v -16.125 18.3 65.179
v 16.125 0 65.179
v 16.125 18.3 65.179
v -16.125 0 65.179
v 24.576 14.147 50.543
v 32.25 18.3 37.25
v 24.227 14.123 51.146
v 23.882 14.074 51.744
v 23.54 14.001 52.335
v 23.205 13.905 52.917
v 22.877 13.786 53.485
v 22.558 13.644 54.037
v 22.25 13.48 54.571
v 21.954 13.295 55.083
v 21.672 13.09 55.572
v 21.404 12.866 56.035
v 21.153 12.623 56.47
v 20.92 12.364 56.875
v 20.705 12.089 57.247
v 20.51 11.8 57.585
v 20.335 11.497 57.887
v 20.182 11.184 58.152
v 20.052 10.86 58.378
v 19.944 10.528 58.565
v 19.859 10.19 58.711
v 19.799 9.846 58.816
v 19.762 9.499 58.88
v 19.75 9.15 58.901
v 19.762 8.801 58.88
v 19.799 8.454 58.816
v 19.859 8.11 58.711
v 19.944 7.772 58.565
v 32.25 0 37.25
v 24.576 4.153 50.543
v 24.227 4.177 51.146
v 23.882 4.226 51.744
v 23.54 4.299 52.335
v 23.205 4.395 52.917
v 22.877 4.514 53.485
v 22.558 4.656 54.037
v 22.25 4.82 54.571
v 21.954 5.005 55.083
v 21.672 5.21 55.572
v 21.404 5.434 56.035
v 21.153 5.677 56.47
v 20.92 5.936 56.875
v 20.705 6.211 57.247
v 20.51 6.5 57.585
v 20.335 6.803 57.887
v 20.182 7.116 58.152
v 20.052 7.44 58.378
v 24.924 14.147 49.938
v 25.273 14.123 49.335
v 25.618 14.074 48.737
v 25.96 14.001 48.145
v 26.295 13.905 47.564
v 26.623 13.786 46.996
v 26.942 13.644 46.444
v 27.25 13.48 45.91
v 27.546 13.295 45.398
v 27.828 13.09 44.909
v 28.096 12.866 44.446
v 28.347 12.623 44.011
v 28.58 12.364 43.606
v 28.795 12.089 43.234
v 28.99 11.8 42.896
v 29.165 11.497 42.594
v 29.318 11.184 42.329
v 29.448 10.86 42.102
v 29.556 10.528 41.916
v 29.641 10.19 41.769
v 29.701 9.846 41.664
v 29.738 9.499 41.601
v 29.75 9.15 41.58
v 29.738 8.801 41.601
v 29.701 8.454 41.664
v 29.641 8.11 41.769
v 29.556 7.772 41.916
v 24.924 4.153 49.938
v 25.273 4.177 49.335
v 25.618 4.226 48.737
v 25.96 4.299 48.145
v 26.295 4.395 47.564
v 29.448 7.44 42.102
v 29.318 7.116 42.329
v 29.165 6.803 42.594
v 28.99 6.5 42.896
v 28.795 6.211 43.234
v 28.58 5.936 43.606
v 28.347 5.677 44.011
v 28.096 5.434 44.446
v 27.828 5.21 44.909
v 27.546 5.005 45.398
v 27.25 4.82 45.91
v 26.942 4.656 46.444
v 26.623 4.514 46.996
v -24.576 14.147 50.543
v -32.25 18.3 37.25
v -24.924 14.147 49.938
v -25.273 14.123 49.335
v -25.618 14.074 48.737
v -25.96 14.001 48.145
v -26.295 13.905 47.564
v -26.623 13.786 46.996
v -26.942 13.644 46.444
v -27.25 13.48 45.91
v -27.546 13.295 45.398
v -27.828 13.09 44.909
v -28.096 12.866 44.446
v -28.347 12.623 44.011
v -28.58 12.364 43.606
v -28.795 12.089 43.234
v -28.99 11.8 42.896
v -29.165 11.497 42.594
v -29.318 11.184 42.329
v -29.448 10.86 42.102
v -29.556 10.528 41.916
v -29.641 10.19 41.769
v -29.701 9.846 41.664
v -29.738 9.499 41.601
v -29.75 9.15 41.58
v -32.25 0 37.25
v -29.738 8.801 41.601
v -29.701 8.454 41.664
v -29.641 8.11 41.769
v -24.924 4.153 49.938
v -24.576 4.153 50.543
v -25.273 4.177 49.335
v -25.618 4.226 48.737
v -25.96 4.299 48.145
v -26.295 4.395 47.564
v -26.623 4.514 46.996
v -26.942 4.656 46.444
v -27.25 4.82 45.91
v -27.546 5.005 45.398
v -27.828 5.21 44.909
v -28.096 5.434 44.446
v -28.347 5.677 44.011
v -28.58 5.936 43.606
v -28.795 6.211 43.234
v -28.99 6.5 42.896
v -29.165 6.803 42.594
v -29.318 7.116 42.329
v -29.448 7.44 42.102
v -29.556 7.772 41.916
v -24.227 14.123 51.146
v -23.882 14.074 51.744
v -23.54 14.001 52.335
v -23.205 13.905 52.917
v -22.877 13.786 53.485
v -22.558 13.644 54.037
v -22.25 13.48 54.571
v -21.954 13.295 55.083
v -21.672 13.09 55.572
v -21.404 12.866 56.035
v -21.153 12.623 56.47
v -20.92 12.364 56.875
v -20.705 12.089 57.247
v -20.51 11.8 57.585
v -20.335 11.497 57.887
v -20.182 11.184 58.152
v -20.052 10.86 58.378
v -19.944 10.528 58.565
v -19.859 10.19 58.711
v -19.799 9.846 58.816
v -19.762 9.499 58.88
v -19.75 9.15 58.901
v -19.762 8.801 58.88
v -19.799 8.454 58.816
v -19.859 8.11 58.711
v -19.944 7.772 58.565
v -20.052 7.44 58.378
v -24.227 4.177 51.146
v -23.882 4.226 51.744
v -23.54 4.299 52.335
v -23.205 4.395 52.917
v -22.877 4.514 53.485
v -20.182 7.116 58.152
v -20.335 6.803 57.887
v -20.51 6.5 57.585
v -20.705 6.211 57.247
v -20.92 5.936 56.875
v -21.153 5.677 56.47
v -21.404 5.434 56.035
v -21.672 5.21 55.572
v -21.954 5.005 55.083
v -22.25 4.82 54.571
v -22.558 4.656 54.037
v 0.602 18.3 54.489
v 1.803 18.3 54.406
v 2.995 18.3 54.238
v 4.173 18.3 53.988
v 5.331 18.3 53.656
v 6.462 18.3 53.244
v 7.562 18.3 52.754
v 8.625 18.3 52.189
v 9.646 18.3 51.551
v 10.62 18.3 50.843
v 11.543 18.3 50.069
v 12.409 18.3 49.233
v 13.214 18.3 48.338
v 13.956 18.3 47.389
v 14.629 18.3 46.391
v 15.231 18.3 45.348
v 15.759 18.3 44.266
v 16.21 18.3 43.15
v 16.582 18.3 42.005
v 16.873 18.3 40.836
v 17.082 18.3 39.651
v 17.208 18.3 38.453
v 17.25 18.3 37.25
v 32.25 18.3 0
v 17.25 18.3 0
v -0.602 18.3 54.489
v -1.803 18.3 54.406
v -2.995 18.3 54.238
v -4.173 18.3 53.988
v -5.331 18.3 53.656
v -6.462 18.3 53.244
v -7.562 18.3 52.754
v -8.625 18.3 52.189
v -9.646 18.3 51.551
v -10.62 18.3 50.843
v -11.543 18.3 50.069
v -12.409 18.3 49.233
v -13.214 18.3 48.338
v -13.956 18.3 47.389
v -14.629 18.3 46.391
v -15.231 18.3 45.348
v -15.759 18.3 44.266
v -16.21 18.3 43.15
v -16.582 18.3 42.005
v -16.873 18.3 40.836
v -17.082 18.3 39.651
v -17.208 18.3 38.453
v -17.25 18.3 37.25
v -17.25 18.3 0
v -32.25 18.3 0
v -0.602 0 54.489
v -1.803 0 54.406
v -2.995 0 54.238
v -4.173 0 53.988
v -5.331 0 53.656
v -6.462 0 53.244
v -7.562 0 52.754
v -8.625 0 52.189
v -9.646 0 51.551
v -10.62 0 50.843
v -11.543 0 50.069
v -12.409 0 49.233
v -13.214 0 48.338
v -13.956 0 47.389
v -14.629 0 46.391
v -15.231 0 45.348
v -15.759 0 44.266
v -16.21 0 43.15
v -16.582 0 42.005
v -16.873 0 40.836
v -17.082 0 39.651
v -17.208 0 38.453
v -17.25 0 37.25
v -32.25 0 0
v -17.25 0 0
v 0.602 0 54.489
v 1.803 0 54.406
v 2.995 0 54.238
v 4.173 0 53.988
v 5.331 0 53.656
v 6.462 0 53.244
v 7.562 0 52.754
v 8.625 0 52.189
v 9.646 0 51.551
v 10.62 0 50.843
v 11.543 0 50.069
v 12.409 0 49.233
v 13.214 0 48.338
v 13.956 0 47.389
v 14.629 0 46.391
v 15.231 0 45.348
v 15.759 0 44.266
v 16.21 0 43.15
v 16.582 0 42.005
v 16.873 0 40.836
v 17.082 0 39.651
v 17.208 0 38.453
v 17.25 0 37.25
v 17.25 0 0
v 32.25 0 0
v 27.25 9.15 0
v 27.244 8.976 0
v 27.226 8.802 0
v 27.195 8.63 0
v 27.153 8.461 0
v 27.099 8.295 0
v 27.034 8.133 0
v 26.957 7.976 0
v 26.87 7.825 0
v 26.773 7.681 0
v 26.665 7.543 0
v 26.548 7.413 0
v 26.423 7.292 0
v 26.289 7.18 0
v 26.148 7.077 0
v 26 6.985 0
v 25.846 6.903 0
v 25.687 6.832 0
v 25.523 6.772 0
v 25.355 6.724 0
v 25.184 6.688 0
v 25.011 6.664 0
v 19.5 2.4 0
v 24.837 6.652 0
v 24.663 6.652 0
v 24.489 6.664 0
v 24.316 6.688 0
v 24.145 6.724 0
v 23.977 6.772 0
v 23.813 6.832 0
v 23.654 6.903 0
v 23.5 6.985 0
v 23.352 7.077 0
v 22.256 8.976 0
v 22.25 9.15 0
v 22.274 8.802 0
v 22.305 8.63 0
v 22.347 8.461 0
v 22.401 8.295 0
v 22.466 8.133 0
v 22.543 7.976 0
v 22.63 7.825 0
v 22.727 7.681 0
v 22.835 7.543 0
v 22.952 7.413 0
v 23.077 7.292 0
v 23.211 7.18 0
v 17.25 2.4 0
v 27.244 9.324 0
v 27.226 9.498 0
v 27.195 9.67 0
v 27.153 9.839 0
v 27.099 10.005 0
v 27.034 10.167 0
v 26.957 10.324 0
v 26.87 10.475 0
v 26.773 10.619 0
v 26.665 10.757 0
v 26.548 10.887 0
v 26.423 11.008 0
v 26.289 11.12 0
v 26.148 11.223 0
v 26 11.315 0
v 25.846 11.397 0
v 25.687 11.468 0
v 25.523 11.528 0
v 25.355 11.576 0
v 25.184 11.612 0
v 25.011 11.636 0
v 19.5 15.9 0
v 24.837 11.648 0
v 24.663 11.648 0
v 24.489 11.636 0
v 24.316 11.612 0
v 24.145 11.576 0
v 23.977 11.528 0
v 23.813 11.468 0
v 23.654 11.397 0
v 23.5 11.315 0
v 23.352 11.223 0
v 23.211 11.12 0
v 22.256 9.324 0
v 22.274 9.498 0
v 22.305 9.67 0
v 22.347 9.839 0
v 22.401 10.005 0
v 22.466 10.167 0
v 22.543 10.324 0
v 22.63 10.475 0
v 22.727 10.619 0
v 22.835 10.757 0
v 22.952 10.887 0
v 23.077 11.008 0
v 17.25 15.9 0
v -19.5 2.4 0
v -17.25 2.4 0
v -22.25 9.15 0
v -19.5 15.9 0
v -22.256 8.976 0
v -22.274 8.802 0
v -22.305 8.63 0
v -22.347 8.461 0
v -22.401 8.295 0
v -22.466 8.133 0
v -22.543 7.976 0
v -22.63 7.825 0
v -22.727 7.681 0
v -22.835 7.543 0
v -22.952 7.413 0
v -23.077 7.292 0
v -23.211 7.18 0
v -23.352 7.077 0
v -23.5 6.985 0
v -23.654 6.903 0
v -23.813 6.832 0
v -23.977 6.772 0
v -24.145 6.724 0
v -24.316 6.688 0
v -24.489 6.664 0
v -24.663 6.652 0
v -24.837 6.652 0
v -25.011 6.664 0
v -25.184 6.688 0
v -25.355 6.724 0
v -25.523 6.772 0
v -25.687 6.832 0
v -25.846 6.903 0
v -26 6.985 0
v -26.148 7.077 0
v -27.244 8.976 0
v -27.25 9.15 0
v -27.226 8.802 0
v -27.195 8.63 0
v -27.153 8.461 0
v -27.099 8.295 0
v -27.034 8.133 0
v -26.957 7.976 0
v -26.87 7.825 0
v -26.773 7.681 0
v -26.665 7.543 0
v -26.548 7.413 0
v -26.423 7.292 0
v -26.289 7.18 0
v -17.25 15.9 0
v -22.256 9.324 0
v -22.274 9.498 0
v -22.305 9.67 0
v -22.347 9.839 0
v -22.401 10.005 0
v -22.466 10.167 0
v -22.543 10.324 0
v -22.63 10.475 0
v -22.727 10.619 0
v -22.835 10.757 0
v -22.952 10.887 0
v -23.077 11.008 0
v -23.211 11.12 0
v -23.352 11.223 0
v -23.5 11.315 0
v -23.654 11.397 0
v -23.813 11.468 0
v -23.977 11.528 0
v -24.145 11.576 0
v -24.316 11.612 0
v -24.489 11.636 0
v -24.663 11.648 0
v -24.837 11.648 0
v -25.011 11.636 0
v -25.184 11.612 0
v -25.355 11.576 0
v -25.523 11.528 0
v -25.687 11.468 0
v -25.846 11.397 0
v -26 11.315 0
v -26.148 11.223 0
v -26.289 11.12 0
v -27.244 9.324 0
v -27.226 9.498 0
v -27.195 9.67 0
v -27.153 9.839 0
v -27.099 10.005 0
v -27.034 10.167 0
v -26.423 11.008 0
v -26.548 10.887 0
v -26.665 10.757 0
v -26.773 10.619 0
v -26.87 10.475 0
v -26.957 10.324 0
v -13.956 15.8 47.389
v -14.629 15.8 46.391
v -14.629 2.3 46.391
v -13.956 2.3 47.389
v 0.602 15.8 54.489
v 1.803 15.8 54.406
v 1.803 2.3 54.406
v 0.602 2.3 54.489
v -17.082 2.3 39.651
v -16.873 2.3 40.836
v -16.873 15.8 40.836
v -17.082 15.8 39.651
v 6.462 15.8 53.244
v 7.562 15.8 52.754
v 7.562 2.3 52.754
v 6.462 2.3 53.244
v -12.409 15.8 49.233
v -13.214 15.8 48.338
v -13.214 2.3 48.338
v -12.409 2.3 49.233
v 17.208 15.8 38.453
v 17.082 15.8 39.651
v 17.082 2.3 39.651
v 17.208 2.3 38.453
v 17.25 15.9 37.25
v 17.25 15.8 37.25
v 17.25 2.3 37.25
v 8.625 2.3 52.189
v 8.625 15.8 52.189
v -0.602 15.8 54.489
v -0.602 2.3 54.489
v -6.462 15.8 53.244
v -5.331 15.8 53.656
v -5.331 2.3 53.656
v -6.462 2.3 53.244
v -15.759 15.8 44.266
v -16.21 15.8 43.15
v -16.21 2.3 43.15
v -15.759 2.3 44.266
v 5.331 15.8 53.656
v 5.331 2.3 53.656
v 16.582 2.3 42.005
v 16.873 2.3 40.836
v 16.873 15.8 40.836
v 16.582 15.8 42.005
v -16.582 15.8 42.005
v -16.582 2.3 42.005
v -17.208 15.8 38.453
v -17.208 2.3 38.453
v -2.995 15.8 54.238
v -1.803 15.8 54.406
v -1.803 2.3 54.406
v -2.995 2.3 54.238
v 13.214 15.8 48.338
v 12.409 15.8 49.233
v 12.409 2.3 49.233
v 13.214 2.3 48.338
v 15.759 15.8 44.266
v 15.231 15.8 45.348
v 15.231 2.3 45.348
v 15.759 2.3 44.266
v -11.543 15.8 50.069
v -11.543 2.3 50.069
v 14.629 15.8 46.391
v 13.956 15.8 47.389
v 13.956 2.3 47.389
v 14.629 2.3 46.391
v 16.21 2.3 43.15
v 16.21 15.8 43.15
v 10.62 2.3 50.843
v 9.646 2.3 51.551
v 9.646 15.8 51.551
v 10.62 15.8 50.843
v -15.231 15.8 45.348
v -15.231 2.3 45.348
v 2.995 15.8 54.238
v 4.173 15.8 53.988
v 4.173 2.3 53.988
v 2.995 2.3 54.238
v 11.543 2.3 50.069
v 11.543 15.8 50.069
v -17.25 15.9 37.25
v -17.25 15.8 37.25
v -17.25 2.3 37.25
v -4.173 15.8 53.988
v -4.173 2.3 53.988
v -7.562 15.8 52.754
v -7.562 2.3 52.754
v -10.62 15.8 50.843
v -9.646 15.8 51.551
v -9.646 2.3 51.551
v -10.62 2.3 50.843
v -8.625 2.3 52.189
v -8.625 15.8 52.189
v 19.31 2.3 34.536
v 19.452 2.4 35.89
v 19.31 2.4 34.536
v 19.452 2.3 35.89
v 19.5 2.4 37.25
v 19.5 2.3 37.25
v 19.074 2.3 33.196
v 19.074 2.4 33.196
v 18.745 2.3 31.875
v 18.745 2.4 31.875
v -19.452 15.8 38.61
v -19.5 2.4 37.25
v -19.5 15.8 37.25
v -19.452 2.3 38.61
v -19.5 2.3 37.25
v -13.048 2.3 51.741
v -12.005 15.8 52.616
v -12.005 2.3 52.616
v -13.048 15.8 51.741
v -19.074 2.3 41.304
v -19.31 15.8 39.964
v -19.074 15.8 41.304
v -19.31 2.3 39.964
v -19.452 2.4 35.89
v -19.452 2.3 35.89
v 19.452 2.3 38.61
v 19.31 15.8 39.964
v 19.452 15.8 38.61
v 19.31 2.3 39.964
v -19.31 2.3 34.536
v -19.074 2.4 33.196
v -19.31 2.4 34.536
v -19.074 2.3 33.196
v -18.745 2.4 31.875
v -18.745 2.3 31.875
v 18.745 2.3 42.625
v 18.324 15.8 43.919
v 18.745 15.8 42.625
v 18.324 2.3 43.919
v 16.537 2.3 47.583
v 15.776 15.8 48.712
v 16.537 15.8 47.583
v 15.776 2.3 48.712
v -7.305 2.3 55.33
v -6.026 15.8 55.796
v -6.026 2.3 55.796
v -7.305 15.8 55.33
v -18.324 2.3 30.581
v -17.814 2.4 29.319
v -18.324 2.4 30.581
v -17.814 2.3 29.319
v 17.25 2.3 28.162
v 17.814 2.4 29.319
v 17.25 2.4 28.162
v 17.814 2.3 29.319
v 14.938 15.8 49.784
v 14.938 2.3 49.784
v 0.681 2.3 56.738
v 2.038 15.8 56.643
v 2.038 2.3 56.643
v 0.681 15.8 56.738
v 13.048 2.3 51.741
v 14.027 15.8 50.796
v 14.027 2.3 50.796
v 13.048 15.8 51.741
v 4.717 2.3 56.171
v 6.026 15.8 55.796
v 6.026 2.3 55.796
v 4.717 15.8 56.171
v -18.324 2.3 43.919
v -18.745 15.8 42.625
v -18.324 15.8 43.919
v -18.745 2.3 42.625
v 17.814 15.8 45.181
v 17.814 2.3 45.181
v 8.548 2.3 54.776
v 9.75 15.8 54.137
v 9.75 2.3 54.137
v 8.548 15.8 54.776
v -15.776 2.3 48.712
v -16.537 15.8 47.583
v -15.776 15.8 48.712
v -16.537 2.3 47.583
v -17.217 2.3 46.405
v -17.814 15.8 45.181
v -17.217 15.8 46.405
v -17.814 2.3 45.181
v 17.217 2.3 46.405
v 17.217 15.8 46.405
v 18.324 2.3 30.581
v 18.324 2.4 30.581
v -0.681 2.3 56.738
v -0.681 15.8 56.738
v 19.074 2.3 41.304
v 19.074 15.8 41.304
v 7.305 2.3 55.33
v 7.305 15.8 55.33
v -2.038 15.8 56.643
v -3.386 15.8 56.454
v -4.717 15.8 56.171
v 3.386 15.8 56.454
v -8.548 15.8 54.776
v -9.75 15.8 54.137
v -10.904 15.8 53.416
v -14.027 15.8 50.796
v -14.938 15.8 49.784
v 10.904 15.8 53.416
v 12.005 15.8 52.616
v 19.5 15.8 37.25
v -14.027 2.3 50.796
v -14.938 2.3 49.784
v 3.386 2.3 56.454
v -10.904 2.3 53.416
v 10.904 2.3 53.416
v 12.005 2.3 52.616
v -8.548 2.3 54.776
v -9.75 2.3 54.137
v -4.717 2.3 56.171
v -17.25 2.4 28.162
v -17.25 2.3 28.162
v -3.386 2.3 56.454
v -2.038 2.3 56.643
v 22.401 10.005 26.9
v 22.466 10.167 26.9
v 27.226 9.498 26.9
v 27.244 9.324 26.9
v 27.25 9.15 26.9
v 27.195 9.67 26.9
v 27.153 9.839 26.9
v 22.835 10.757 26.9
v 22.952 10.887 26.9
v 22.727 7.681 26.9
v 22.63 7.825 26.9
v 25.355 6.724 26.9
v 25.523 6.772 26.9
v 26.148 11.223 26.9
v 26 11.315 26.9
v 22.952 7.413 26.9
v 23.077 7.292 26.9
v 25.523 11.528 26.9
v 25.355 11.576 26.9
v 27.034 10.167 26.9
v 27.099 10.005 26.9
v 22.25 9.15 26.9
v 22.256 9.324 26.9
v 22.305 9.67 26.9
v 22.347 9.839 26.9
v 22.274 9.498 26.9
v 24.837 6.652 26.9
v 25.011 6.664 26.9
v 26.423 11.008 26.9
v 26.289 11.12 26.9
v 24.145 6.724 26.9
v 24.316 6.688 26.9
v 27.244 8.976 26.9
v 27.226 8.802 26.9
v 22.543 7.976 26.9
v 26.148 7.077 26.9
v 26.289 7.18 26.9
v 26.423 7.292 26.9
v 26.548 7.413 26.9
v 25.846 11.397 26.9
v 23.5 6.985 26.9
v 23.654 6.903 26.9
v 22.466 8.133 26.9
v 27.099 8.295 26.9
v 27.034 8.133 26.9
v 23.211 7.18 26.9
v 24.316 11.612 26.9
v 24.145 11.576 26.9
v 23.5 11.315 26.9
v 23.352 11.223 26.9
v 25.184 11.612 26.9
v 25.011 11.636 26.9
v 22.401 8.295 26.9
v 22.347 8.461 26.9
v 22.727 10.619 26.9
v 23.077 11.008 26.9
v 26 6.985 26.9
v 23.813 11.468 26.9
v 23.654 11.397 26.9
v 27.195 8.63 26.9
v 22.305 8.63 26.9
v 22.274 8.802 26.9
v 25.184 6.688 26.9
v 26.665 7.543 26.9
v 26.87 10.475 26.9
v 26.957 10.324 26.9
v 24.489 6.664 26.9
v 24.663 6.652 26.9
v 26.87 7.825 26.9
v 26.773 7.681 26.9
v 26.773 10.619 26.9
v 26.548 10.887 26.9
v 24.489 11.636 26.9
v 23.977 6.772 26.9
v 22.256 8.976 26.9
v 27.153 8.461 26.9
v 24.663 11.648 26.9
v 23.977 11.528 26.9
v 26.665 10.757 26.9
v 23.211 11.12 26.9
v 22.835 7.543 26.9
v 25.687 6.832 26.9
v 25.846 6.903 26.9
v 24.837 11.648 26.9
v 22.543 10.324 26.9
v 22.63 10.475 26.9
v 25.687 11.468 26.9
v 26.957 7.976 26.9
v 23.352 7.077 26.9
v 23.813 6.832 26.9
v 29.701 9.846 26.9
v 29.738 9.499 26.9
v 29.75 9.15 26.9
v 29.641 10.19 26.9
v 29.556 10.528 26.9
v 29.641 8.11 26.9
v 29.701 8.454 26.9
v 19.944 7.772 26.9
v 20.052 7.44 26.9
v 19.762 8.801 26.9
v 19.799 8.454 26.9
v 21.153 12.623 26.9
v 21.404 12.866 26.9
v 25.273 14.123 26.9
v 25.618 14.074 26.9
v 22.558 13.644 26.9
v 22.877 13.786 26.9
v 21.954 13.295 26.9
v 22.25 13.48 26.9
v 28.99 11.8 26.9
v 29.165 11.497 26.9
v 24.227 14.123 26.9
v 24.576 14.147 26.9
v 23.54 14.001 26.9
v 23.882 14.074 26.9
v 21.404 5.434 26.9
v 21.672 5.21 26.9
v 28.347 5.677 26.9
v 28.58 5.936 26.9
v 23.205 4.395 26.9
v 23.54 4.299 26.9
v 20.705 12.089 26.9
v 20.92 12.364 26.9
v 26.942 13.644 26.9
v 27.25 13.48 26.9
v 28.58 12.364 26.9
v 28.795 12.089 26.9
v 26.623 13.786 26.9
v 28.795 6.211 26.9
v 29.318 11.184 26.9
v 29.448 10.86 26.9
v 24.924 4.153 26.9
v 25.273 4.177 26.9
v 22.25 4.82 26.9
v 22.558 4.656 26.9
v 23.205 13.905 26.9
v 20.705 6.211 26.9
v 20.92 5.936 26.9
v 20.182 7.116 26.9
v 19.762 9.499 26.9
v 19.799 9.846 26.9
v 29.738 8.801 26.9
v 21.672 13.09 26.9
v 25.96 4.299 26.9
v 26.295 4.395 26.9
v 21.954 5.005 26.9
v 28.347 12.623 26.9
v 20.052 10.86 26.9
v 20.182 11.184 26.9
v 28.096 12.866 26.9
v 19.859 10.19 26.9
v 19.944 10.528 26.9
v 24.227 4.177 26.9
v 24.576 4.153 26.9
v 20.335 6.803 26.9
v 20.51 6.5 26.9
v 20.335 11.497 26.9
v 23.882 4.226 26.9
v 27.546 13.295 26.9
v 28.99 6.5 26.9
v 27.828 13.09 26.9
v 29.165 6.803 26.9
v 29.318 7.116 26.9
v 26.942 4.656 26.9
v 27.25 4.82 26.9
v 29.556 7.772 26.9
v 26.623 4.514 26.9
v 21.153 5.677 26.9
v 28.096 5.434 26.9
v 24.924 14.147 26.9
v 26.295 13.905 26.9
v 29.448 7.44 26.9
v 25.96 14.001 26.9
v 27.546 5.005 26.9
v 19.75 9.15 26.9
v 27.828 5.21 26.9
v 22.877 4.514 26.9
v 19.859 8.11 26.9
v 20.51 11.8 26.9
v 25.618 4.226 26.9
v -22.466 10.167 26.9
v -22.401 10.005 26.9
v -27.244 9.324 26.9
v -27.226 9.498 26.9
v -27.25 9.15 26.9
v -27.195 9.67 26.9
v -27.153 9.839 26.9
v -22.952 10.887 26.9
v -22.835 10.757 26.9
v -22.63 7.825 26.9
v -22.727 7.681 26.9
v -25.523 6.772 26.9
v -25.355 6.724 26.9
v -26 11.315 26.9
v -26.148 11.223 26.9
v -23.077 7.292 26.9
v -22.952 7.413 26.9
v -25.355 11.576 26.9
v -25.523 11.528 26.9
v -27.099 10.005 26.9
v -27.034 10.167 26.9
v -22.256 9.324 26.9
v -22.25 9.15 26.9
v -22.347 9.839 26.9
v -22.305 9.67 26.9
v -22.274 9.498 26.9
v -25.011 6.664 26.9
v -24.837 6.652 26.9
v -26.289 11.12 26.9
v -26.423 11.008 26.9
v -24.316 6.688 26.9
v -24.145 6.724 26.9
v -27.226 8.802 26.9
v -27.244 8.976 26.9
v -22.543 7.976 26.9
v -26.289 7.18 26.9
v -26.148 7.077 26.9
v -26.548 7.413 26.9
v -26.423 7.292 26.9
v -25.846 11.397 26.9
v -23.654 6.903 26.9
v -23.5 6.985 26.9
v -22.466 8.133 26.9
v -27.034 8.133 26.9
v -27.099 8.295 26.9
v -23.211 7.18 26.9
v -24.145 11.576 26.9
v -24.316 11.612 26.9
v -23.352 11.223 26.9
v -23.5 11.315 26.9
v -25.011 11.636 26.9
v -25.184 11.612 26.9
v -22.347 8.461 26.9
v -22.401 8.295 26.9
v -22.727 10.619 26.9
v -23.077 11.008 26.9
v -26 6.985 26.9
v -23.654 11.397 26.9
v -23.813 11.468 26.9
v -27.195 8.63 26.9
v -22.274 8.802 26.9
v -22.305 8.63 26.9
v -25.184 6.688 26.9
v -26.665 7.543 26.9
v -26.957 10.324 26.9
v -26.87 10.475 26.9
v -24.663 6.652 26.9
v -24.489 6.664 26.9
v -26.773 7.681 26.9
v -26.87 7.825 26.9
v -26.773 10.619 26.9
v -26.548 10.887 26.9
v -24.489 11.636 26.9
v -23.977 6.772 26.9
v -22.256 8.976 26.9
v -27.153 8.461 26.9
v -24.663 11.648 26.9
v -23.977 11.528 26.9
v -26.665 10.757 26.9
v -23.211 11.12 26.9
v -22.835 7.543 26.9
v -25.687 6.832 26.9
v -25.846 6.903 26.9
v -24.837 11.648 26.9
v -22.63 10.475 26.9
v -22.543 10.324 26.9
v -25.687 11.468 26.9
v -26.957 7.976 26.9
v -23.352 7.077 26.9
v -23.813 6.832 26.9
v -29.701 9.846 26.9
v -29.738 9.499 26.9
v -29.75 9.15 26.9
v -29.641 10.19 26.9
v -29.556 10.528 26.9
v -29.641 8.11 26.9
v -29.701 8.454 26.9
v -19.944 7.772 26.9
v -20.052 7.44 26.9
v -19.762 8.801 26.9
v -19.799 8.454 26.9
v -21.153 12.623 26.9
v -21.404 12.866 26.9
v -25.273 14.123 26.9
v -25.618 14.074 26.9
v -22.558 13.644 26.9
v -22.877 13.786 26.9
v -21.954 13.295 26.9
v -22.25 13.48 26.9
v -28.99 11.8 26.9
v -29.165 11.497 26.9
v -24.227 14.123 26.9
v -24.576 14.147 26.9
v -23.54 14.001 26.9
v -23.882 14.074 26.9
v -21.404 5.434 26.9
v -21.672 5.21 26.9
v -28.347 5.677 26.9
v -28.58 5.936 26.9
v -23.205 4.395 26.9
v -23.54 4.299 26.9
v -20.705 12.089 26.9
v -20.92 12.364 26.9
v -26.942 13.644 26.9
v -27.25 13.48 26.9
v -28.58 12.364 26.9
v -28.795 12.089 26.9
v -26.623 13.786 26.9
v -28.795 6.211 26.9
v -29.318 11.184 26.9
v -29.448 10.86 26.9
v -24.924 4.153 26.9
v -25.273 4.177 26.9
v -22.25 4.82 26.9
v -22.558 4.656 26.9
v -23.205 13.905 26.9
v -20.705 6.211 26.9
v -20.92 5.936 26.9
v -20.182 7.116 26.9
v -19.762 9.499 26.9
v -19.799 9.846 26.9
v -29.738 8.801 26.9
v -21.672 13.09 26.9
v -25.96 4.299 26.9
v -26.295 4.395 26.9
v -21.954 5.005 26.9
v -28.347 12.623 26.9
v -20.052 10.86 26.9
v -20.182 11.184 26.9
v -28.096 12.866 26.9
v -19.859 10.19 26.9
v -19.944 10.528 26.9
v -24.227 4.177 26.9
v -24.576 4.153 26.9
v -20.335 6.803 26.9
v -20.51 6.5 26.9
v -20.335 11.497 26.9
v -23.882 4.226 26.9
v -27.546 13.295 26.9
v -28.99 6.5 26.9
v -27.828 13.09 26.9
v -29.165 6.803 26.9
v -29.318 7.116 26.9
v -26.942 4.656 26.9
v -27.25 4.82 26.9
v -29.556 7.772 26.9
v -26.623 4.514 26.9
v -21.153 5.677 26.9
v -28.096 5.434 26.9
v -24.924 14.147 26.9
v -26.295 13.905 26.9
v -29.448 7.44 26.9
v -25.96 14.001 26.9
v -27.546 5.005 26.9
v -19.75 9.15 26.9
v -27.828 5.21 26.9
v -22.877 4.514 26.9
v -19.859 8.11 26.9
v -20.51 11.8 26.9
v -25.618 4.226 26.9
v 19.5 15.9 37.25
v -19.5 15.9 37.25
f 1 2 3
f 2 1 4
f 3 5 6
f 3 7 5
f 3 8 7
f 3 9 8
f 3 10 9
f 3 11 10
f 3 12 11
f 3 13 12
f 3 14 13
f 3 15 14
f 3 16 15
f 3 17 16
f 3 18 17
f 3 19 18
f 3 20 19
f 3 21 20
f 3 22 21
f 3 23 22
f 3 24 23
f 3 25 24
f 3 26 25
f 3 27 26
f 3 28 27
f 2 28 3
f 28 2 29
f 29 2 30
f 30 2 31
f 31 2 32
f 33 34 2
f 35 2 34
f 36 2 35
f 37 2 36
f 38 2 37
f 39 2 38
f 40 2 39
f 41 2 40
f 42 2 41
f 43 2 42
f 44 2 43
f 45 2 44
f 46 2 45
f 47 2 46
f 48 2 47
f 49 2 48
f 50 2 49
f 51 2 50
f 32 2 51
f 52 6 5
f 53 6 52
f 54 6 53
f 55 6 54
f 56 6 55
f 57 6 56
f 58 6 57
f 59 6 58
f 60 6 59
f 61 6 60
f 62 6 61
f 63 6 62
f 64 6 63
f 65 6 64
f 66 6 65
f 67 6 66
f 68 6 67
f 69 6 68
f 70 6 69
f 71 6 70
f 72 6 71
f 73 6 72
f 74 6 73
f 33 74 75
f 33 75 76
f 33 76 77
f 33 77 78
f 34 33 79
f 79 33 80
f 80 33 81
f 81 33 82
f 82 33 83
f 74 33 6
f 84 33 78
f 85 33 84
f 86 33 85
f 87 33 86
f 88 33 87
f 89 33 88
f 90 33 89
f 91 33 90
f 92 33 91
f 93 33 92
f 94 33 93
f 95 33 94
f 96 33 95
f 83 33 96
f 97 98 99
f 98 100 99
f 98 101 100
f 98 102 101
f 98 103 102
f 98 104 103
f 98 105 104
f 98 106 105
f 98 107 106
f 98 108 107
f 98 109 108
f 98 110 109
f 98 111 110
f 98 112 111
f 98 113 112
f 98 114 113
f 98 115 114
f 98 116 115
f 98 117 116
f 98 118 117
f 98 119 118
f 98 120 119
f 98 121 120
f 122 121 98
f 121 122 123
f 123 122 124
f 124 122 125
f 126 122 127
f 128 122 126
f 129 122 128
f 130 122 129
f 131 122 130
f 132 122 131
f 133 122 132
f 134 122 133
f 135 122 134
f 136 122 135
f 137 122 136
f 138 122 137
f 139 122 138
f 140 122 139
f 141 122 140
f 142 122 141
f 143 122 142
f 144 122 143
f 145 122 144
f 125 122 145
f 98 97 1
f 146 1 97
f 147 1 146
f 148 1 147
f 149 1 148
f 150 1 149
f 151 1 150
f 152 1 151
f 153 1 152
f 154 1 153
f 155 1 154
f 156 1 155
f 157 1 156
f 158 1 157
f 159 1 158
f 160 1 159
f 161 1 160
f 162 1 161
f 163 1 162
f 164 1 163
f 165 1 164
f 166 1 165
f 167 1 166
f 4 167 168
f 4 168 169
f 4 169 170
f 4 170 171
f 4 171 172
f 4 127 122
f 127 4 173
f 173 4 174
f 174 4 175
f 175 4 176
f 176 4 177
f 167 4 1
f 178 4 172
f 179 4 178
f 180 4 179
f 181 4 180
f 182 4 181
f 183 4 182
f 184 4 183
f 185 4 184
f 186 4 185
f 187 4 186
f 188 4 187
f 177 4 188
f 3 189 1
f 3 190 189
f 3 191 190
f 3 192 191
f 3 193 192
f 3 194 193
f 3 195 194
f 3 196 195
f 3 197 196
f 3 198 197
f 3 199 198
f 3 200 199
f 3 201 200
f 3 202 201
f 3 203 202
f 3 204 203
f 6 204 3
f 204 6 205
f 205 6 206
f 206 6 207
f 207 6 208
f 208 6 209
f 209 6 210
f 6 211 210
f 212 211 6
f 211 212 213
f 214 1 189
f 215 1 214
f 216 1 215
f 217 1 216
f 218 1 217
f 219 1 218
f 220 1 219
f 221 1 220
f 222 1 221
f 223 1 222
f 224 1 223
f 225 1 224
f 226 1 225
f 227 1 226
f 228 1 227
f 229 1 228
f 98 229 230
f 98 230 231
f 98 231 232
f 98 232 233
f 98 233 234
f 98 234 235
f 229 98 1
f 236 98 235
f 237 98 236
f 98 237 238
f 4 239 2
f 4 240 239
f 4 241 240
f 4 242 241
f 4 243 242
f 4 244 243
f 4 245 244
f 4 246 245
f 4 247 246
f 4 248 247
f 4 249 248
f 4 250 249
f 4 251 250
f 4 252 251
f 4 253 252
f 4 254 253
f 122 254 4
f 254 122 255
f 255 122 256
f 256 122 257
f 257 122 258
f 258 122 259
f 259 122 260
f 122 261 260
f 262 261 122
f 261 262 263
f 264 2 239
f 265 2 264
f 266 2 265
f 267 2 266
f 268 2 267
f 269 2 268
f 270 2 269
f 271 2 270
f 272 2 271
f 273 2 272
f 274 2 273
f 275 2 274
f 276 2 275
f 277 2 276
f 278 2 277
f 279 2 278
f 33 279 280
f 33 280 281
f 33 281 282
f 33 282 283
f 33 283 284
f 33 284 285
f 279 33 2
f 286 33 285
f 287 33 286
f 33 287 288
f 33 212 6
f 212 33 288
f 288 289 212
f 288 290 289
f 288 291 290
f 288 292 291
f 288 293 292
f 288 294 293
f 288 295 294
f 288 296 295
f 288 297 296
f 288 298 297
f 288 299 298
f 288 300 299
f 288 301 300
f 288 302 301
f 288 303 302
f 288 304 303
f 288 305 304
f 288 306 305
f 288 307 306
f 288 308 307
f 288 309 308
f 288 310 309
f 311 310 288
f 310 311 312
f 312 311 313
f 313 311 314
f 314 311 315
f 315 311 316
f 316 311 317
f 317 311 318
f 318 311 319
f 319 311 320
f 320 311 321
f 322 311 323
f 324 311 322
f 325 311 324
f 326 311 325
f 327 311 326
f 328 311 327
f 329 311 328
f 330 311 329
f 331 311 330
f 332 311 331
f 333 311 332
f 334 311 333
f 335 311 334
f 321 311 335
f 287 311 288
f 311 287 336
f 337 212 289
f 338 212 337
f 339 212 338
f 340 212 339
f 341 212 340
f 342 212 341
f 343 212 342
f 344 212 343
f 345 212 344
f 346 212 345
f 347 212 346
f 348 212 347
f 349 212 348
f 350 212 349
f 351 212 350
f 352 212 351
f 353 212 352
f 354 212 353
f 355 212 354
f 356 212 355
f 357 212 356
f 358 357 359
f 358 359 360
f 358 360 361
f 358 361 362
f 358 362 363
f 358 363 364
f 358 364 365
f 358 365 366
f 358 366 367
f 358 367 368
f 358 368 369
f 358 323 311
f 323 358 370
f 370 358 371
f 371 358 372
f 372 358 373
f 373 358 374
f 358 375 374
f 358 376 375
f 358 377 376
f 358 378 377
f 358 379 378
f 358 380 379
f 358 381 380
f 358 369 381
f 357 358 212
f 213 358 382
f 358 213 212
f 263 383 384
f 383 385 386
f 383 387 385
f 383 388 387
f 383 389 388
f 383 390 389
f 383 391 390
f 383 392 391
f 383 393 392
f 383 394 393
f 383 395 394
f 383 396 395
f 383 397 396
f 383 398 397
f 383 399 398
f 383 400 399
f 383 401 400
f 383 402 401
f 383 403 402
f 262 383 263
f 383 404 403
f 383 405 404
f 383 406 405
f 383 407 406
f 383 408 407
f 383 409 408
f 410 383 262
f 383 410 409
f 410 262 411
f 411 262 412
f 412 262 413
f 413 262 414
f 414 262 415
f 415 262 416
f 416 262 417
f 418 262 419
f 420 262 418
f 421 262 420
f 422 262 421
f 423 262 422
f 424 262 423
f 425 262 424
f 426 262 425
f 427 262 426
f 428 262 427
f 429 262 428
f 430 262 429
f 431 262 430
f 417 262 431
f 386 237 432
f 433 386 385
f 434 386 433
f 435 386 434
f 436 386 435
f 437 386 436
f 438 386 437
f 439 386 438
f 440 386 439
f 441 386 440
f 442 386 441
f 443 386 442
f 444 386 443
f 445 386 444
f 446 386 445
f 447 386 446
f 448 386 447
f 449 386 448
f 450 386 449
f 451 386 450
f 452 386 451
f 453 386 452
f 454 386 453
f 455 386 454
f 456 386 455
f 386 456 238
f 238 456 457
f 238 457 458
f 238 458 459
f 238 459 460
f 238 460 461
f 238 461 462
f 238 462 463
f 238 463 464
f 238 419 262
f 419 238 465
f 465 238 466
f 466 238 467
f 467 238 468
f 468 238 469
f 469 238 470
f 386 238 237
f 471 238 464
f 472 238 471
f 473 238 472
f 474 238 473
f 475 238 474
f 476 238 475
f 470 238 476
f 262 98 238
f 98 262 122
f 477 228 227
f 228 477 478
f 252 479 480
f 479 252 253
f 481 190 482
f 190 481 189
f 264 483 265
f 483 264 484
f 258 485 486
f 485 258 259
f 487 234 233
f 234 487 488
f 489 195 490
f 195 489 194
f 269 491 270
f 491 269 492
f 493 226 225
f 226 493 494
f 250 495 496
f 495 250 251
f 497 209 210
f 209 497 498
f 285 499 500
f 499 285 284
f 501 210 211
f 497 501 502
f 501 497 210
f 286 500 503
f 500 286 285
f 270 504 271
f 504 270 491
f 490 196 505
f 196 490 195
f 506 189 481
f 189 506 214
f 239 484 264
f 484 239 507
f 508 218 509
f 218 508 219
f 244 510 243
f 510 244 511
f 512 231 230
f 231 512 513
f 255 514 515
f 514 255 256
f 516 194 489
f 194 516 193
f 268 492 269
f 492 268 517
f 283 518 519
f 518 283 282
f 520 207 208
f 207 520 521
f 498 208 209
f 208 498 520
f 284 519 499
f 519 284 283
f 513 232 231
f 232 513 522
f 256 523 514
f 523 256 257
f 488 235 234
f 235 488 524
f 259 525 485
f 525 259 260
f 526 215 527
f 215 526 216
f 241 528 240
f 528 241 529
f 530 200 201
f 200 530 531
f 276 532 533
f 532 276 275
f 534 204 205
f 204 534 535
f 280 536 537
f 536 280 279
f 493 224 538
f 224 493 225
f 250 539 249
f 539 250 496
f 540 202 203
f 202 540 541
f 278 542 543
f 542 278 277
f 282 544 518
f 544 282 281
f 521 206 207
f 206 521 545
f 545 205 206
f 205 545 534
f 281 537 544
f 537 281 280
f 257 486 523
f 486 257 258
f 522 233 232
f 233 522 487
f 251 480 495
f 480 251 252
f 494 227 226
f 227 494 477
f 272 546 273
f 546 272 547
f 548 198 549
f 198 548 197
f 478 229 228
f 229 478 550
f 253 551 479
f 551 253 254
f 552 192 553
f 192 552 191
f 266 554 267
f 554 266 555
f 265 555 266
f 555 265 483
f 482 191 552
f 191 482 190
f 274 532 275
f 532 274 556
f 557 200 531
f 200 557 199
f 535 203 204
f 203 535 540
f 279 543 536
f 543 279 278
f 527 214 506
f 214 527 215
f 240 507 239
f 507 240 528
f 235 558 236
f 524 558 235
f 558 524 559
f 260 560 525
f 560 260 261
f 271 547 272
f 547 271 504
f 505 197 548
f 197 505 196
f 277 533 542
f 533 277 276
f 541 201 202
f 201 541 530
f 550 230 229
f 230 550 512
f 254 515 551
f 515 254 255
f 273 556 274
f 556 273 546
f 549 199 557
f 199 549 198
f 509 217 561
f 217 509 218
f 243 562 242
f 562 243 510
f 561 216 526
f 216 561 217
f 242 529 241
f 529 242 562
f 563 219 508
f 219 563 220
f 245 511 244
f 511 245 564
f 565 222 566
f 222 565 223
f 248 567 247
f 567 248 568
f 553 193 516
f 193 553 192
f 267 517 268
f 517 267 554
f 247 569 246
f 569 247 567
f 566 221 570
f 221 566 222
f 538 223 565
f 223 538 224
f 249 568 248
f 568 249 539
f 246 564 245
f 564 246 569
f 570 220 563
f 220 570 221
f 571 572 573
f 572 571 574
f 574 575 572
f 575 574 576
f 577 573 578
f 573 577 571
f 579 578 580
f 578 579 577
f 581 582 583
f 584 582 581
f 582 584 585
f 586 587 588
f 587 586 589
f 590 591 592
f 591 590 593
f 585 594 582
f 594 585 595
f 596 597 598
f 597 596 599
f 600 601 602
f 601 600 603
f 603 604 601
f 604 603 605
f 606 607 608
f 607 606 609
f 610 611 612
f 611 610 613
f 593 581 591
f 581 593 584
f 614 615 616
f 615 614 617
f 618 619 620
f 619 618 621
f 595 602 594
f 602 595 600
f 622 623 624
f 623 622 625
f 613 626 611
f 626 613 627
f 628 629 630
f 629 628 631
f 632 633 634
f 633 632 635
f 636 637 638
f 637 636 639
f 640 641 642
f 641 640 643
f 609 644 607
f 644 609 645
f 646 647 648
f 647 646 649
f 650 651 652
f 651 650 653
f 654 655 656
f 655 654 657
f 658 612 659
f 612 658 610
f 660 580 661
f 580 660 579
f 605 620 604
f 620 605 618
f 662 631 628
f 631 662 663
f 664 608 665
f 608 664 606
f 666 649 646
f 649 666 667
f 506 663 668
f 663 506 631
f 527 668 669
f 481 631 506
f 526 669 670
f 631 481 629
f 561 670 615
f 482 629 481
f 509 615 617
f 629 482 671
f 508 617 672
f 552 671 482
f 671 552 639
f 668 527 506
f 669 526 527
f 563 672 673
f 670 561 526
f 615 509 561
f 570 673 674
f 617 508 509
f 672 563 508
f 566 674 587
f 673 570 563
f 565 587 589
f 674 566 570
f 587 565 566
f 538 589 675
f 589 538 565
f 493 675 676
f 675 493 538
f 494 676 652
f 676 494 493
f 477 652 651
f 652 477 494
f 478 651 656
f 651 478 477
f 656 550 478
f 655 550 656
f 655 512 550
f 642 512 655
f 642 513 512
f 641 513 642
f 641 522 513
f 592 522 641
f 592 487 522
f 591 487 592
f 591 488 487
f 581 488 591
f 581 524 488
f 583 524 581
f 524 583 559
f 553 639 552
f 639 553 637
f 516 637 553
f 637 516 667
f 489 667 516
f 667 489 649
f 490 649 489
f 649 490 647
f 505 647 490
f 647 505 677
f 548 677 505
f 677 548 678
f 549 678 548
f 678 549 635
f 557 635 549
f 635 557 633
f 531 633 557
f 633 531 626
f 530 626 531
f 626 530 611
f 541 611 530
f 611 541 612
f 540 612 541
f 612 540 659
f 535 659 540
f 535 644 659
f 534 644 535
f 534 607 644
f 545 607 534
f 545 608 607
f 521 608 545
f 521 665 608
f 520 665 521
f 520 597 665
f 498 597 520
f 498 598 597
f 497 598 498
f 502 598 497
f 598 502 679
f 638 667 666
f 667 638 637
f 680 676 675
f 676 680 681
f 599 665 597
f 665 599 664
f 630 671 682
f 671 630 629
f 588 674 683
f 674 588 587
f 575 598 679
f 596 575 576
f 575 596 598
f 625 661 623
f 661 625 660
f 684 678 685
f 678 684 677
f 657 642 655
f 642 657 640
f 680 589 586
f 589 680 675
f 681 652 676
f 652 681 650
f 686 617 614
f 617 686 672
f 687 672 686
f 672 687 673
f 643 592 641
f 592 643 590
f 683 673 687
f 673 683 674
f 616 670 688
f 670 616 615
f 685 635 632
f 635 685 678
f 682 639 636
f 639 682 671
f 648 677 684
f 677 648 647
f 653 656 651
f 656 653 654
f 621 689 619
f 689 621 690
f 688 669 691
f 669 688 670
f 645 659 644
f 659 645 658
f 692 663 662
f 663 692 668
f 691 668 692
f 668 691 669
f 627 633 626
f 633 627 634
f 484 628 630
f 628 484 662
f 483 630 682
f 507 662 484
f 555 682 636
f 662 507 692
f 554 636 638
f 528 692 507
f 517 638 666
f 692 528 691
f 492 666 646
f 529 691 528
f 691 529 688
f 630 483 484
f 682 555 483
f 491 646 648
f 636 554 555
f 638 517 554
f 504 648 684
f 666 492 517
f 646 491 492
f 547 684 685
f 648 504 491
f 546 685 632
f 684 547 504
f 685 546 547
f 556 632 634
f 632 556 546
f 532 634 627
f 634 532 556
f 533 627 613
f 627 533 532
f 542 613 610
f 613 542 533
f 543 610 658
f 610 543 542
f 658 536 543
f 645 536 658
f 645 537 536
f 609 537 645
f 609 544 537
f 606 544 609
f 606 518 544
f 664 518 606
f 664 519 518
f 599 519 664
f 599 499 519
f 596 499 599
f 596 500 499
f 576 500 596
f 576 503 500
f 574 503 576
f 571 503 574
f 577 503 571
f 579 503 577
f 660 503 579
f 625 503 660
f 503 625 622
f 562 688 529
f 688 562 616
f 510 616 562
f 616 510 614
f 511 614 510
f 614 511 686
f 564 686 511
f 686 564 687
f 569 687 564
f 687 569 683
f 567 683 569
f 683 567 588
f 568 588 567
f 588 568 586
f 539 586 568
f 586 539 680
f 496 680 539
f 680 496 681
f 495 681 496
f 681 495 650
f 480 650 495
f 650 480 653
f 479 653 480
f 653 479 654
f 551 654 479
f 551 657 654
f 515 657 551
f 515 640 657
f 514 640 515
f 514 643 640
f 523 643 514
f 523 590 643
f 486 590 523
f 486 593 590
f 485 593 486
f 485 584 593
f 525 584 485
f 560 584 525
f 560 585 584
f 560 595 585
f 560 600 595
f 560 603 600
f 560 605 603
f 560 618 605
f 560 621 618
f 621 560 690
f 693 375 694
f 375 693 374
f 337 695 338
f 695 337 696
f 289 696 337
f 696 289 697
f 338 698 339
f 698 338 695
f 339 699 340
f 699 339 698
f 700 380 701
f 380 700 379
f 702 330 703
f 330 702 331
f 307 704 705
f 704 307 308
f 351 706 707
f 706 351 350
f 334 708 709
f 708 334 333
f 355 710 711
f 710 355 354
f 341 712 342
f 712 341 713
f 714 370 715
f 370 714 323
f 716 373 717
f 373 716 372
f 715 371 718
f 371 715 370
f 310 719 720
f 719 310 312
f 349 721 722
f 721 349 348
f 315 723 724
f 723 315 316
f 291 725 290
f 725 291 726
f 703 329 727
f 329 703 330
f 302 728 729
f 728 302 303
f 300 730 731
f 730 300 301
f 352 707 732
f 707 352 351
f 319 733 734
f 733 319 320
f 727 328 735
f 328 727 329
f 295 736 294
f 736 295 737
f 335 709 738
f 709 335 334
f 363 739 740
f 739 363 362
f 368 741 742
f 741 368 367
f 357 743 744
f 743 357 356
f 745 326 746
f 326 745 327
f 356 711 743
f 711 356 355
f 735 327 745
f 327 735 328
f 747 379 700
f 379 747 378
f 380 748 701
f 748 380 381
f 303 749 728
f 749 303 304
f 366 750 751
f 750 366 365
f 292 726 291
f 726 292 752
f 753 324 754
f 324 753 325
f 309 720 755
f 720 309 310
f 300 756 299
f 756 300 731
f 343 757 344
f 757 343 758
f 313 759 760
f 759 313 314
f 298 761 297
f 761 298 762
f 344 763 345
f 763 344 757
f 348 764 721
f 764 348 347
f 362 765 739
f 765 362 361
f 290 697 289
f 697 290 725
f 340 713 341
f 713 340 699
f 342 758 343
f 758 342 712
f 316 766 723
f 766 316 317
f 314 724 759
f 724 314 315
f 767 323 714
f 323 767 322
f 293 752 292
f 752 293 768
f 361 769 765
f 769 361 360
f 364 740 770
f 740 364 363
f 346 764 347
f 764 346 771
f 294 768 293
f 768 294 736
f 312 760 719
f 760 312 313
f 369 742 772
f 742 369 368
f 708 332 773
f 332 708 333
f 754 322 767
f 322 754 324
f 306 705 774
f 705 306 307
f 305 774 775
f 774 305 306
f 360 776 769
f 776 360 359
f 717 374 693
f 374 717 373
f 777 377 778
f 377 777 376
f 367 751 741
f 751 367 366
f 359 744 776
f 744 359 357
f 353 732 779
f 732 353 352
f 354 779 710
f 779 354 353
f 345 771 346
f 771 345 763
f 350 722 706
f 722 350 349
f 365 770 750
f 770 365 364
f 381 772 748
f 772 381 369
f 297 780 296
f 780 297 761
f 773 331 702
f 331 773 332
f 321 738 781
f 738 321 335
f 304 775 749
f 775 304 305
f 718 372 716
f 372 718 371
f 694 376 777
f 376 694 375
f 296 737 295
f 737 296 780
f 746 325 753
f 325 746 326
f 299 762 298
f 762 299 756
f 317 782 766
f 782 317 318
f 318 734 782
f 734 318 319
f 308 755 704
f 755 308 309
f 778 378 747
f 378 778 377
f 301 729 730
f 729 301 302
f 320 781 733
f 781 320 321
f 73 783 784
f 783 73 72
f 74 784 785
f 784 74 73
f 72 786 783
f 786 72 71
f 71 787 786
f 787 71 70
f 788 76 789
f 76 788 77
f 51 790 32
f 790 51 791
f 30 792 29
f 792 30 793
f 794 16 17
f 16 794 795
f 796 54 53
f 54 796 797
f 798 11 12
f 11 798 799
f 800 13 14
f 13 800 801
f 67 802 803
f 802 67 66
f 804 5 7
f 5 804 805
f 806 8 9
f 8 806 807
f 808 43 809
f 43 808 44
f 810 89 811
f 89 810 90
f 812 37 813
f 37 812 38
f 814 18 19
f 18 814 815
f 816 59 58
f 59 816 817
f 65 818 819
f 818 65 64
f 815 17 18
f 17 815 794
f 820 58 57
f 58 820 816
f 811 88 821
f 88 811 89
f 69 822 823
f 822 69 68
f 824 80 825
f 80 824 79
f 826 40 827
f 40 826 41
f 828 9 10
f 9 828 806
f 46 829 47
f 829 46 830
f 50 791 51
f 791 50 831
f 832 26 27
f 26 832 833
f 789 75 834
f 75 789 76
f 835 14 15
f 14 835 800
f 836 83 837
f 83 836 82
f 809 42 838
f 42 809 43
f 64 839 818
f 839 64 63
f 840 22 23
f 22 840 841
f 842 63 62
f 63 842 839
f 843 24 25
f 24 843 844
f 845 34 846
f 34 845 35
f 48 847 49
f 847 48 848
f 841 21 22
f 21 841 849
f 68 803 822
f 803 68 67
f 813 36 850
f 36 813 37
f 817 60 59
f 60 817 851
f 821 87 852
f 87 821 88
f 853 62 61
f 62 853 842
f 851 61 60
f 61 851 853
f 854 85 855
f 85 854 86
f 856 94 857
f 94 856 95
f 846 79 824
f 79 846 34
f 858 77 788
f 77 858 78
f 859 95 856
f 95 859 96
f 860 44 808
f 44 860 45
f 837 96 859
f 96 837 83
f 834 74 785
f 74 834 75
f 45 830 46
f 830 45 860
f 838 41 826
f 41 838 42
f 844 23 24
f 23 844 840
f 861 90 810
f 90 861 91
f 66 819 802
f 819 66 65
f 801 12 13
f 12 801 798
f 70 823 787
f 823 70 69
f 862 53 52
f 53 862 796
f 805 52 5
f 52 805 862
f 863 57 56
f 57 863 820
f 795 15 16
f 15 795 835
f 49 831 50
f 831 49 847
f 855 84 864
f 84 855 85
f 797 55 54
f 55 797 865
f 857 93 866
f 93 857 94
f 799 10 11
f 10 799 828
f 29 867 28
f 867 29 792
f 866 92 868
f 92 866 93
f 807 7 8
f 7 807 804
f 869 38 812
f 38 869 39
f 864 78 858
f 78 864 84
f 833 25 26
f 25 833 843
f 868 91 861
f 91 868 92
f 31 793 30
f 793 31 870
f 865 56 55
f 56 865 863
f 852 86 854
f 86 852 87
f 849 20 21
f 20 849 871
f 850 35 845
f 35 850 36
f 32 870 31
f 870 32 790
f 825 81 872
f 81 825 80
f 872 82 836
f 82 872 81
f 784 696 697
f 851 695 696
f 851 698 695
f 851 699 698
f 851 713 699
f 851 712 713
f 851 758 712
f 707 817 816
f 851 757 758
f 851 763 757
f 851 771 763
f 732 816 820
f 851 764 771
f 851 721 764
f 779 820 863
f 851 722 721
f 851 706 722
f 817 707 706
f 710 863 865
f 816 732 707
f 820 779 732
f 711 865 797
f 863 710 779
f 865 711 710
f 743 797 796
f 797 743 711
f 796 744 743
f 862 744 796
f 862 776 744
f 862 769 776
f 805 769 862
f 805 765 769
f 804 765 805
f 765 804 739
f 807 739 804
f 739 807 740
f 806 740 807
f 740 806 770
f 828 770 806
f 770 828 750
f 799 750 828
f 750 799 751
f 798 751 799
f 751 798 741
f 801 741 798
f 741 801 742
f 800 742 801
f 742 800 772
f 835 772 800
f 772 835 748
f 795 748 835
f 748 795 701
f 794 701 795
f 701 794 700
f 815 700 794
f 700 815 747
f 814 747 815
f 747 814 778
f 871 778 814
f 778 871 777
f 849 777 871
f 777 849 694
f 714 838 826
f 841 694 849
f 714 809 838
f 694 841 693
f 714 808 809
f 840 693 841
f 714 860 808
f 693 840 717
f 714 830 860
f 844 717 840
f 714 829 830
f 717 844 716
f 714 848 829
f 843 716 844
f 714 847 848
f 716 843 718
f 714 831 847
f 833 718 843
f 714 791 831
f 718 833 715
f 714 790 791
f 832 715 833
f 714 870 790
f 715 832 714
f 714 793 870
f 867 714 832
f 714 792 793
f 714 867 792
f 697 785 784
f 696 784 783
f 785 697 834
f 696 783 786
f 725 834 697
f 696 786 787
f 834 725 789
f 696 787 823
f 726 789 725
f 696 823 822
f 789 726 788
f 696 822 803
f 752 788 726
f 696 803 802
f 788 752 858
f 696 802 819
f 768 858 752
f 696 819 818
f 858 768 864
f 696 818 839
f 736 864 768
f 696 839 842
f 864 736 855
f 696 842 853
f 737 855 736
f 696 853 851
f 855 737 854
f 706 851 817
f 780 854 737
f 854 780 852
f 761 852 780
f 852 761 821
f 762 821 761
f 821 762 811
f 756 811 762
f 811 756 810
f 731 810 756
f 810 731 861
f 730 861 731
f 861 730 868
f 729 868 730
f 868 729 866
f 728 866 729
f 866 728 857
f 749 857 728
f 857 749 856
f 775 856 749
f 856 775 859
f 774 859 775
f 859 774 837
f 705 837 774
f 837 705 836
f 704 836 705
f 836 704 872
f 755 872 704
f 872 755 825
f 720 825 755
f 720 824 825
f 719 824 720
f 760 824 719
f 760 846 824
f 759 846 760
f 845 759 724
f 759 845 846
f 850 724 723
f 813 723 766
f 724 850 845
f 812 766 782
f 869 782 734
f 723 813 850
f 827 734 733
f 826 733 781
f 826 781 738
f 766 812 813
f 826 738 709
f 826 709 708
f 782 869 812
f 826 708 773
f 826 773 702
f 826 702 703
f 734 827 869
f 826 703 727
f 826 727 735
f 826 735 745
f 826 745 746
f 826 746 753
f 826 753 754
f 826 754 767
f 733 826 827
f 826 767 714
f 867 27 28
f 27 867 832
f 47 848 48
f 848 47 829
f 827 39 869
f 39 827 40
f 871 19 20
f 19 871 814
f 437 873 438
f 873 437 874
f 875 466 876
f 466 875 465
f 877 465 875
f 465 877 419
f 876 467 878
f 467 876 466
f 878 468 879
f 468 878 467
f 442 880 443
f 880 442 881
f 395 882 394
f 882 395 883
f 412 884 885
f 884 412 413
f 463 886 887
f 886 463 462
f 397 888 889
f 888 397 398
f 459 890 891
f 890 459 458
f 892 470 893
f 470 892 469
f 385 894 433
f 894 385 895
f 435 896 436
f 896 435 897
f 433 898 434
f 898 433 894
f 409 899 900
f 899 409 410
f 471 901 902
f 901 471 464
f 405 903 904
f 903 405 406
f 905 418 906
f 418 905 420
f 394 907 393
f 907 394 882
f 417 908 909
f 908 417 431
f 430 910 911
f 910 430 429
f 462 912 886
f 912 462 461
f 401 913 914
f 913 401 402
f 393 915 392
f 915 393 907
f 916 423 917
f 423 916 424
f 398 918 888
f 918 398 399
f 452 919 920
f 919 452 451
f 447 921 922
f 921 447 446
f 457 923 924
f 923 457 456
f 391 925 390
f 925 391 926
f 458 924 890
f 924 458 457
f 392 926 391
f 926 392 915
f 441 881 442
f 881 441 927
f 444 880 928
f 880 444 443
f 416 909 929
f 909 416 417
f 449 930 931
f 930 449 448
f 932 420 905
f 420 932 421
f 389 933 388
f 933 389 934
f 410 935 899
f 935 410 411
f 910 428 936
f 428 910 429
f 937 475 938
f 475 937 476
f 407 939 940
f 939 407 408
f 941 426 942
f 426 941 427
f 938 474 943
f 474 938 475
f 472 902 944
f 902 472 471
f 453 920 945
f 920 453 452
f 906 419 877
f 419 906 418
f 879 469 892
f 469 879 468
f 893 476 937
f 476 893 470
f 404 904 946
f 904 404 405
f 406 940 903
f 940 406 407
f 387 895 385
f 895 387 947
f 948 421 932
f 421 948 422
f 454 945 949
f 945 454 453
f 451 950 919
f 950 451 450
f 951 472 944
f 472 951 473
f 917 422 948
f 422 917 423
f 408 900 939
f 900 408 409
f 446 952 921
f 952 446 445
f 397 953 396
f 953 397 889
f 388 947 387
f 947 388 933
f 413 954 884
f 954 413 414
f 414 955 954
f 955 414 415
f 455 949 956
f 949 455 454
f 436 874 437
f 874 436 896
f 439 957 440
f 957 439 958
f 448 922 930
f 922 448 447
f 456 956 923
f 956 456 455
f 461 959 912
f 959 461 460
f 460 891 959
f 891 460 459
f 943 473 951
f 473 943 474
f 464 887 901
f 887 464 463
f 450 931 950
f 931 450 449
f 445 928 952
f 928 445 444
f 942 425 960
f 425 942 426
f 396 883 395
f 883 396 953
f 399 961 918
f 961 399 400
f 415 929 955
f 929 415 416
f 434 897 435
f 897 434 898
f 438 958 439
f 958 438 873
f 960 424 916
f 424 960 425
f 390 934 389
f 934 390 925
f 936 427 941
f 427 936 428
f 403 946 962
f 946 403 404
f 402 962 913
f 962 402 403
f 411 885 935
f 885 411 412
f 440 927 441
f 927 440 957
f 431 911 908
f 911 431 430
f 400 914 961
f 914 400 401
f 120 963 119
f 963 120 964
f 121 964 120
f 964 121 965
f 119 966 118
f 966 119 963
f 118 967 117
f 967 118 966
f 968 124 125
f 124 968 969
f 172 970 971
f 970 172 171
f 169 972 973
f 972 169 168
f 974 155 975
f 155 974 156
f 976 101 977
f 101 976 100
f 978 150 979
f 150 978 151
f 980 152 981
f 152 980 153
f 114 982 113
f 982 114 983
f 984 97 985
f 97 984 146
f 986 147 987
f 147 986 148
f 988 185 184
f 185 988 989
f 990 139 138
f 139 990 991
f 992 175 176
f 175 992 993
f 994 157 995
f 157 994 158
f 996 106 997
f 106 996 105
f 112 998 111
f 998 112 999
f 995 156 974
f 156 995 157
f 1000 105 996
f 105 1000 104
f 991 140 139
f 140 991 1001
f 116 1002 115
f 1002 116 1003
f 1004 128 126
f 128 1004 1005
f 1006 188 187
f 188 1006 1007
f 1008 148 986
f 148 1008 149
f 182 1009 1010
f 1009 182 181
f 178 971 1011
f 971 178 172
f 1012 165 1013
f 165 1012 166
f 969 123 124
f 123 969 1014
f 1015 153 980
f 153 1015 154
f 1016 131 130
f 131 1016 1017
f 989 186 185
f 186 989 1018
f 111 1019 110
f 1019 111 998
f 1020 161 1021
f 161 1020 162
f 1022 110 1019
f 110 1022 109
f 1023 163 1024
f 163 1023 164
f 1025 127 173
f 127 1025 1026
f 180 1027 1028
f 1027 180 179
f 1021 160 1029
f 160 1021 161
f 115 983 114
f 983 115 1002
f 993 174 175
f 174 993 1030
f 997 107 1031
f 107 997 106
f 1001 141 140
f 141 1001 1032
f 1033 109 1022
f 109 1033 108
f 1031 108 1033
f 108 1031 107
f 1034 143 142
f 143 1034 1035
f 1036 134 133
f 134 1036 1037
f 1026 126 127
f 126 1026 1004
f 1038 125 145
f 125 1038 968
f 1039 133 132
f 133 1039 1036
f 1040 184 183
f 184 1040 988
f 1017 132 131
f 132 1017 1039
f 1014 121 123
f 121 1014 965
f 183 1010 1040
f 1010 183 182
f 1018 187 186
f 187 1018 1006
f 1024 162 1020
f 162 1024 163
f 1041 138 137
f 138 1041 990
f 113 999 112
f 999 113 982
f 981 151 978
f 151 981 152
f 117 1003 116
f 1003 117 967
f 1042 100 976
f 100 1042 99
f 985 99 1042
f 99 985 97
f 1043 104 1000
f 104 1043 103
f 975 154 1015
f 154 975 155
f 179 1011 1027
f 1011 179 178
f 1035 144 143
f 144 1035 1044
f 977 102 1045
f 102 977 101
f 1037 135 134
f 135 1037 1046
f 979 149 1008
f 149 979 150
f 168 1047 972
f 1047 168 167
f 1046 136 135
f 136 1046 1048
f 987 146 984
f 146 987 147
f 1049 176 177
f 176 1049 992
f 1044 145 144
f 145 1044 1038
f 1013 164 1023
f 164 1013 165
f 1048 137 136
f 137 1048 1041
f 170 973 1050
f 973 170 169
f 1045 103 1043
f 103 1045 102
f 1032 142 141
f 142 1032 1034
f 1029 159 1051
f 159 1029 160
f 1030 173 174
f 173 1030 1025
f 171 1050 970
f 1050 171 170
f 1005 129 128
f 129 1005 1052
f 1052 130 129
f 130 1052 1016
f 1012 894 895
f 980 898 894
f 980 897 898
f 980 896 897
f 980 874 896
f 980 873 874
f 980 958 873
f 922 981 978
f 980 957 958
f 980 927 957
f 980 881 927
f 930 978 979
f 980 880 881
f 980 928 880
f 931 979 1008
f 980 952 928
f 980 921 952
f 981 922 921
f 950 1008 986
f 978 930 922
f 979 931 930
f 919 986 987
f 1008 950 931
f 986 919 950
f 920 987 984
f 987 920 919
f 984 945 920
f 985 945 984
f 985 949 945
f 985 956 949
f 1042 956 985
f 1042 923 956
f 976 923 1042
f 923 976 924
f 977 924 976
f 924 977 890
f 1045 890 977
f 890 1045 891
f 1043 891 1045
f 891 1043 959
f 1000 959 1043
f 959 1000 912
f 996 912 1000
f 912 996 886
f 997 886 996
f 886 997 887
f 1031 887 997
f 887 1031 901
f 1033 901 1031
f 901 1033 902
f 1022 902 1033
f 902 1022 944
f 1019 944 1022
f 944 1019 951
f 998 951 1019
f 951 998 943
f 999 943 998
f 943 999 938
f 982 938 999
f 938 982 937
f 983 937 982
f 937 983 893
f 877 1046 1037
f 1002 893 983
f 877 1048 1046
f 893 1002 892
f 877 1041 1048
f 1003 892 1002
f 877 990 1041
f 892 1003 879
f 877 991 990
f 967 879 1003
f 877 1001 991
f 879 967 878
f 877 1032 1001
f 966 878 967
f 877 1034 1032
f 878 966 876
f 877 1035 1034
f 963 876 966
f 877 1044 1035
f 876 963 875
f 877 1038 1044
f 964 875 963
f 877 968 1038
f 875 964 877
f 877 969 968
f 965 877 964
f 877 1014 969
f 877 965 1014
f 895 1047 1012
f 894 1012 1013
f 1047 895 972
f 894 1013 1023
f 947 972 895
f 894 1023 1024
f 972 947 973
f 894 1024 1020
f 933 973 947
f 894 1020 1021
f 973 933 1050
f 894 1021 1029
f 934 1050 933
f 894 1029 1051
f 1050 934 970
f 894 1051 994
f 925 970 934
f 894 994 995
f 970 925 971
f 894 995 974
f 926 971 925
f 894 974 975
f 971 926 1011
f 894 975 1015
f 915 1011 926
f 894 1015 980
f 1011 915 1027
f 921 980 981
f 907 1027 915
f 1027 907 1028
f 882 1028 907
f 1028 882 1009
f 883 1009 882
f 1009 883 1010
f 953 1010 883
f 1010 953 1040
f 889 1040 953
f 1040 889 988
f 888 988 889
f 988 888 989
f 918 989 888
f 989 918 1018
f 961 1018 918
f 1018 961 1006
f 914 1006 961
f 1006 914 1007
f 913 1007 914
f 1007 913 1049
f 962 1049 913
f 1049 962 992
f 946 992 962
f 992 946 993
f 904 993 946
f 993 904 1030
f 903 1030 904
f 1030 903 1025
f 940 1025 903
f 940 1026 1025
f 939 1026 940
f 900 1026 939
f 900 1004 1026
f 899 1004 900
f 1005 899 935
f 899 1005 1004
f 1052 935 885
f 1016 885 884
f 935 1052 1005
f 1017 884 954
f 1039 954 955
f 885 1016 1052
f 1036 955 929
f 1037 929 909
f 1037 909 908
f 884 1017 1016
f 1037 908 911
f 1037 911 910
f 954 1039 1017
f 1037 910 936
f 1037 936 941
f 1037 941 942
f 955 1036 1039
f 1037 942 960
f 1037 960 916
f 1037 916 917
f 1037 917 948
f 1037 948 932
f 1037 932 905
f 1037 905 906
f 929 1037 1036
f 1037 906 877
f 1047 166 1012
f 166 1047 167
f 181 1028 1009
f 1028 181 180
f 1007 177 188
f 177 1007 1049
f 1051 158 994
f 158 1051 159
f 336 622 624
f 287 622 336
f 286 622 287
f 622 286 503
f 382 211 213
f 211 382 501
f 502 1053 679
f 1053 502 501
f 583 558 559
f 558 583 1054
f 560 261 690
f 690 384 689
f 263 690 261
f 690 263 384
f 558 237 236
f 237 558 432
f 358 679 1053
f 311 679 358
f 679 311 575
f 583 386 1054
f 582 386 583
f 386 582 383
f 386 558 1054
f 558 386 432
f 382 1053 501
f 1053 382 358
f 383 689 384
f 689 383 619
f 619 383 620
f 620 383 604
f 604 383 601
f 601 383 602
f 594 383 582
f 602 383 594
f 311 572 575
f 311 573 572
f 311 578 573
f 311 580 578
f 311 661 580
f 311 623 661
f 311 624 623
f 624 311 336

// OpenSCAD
socket=34.5;
$fn=90;
socket_channel=39;
socket_channel_w=13.5;
extrusion_width=1.2;
width=socket_channel_w+extrusion_width*4;
v_gap=0.5;
tightness=0.5;

height=20;
screw=5;
screw_head=10;
screw_h=27;
wall=15;
walll=wall*2;

pad=0.1;
padd=pad*2;


module body() {
    translate([0,0,socket/2+height])
    rotate([-90,0,0])
    cylinder(d=socket+walll,h=width,$fn=6);

    translate([-socket/2-wall,0,0])
    cube([socket+walll,width,height+socket/2]);
}

module socket() {
    translate([0,-pad,socket/2+height])
    rotate([-90,0,0]) {
        cylinder(d=socket,h=width+padd);
        translate([0,0,width/2-socket_channel_w/2])
        cylinder(d=socket_channel,h=socket_channel_w);
    }
}

module screw() {
    translate([socket/2+wall/2,width/2,-pad]) {
        cylinder(d=screw,h=height+socket+walll+padd);
        translate([0,0,screw_h])
        cylinder(d=screw_head,h=height+socket+walll+padd);
    }
}

module screws() {
    screw();
    mirror([1,0,0])
    screw();
}

module insert() {
    translate([-socket/2,-pad,-pad])
    cube([socket,width+padd,height+socket/2+pad]);
    translate([-socket_channel/2,width/2-socket_channel_w/2,-pad])
    cube([socket_channel,socket_channel_w,height+socket/2+pad]);
}

module main() {
    difference() {
        body();
        socket();
        screws();
    }
}

module inside() {
    intersection() {
        main();
        insert();
    }
}


module outside() {
    difference() {
        main();
        insert();
    }
}

outside();
//inside();
